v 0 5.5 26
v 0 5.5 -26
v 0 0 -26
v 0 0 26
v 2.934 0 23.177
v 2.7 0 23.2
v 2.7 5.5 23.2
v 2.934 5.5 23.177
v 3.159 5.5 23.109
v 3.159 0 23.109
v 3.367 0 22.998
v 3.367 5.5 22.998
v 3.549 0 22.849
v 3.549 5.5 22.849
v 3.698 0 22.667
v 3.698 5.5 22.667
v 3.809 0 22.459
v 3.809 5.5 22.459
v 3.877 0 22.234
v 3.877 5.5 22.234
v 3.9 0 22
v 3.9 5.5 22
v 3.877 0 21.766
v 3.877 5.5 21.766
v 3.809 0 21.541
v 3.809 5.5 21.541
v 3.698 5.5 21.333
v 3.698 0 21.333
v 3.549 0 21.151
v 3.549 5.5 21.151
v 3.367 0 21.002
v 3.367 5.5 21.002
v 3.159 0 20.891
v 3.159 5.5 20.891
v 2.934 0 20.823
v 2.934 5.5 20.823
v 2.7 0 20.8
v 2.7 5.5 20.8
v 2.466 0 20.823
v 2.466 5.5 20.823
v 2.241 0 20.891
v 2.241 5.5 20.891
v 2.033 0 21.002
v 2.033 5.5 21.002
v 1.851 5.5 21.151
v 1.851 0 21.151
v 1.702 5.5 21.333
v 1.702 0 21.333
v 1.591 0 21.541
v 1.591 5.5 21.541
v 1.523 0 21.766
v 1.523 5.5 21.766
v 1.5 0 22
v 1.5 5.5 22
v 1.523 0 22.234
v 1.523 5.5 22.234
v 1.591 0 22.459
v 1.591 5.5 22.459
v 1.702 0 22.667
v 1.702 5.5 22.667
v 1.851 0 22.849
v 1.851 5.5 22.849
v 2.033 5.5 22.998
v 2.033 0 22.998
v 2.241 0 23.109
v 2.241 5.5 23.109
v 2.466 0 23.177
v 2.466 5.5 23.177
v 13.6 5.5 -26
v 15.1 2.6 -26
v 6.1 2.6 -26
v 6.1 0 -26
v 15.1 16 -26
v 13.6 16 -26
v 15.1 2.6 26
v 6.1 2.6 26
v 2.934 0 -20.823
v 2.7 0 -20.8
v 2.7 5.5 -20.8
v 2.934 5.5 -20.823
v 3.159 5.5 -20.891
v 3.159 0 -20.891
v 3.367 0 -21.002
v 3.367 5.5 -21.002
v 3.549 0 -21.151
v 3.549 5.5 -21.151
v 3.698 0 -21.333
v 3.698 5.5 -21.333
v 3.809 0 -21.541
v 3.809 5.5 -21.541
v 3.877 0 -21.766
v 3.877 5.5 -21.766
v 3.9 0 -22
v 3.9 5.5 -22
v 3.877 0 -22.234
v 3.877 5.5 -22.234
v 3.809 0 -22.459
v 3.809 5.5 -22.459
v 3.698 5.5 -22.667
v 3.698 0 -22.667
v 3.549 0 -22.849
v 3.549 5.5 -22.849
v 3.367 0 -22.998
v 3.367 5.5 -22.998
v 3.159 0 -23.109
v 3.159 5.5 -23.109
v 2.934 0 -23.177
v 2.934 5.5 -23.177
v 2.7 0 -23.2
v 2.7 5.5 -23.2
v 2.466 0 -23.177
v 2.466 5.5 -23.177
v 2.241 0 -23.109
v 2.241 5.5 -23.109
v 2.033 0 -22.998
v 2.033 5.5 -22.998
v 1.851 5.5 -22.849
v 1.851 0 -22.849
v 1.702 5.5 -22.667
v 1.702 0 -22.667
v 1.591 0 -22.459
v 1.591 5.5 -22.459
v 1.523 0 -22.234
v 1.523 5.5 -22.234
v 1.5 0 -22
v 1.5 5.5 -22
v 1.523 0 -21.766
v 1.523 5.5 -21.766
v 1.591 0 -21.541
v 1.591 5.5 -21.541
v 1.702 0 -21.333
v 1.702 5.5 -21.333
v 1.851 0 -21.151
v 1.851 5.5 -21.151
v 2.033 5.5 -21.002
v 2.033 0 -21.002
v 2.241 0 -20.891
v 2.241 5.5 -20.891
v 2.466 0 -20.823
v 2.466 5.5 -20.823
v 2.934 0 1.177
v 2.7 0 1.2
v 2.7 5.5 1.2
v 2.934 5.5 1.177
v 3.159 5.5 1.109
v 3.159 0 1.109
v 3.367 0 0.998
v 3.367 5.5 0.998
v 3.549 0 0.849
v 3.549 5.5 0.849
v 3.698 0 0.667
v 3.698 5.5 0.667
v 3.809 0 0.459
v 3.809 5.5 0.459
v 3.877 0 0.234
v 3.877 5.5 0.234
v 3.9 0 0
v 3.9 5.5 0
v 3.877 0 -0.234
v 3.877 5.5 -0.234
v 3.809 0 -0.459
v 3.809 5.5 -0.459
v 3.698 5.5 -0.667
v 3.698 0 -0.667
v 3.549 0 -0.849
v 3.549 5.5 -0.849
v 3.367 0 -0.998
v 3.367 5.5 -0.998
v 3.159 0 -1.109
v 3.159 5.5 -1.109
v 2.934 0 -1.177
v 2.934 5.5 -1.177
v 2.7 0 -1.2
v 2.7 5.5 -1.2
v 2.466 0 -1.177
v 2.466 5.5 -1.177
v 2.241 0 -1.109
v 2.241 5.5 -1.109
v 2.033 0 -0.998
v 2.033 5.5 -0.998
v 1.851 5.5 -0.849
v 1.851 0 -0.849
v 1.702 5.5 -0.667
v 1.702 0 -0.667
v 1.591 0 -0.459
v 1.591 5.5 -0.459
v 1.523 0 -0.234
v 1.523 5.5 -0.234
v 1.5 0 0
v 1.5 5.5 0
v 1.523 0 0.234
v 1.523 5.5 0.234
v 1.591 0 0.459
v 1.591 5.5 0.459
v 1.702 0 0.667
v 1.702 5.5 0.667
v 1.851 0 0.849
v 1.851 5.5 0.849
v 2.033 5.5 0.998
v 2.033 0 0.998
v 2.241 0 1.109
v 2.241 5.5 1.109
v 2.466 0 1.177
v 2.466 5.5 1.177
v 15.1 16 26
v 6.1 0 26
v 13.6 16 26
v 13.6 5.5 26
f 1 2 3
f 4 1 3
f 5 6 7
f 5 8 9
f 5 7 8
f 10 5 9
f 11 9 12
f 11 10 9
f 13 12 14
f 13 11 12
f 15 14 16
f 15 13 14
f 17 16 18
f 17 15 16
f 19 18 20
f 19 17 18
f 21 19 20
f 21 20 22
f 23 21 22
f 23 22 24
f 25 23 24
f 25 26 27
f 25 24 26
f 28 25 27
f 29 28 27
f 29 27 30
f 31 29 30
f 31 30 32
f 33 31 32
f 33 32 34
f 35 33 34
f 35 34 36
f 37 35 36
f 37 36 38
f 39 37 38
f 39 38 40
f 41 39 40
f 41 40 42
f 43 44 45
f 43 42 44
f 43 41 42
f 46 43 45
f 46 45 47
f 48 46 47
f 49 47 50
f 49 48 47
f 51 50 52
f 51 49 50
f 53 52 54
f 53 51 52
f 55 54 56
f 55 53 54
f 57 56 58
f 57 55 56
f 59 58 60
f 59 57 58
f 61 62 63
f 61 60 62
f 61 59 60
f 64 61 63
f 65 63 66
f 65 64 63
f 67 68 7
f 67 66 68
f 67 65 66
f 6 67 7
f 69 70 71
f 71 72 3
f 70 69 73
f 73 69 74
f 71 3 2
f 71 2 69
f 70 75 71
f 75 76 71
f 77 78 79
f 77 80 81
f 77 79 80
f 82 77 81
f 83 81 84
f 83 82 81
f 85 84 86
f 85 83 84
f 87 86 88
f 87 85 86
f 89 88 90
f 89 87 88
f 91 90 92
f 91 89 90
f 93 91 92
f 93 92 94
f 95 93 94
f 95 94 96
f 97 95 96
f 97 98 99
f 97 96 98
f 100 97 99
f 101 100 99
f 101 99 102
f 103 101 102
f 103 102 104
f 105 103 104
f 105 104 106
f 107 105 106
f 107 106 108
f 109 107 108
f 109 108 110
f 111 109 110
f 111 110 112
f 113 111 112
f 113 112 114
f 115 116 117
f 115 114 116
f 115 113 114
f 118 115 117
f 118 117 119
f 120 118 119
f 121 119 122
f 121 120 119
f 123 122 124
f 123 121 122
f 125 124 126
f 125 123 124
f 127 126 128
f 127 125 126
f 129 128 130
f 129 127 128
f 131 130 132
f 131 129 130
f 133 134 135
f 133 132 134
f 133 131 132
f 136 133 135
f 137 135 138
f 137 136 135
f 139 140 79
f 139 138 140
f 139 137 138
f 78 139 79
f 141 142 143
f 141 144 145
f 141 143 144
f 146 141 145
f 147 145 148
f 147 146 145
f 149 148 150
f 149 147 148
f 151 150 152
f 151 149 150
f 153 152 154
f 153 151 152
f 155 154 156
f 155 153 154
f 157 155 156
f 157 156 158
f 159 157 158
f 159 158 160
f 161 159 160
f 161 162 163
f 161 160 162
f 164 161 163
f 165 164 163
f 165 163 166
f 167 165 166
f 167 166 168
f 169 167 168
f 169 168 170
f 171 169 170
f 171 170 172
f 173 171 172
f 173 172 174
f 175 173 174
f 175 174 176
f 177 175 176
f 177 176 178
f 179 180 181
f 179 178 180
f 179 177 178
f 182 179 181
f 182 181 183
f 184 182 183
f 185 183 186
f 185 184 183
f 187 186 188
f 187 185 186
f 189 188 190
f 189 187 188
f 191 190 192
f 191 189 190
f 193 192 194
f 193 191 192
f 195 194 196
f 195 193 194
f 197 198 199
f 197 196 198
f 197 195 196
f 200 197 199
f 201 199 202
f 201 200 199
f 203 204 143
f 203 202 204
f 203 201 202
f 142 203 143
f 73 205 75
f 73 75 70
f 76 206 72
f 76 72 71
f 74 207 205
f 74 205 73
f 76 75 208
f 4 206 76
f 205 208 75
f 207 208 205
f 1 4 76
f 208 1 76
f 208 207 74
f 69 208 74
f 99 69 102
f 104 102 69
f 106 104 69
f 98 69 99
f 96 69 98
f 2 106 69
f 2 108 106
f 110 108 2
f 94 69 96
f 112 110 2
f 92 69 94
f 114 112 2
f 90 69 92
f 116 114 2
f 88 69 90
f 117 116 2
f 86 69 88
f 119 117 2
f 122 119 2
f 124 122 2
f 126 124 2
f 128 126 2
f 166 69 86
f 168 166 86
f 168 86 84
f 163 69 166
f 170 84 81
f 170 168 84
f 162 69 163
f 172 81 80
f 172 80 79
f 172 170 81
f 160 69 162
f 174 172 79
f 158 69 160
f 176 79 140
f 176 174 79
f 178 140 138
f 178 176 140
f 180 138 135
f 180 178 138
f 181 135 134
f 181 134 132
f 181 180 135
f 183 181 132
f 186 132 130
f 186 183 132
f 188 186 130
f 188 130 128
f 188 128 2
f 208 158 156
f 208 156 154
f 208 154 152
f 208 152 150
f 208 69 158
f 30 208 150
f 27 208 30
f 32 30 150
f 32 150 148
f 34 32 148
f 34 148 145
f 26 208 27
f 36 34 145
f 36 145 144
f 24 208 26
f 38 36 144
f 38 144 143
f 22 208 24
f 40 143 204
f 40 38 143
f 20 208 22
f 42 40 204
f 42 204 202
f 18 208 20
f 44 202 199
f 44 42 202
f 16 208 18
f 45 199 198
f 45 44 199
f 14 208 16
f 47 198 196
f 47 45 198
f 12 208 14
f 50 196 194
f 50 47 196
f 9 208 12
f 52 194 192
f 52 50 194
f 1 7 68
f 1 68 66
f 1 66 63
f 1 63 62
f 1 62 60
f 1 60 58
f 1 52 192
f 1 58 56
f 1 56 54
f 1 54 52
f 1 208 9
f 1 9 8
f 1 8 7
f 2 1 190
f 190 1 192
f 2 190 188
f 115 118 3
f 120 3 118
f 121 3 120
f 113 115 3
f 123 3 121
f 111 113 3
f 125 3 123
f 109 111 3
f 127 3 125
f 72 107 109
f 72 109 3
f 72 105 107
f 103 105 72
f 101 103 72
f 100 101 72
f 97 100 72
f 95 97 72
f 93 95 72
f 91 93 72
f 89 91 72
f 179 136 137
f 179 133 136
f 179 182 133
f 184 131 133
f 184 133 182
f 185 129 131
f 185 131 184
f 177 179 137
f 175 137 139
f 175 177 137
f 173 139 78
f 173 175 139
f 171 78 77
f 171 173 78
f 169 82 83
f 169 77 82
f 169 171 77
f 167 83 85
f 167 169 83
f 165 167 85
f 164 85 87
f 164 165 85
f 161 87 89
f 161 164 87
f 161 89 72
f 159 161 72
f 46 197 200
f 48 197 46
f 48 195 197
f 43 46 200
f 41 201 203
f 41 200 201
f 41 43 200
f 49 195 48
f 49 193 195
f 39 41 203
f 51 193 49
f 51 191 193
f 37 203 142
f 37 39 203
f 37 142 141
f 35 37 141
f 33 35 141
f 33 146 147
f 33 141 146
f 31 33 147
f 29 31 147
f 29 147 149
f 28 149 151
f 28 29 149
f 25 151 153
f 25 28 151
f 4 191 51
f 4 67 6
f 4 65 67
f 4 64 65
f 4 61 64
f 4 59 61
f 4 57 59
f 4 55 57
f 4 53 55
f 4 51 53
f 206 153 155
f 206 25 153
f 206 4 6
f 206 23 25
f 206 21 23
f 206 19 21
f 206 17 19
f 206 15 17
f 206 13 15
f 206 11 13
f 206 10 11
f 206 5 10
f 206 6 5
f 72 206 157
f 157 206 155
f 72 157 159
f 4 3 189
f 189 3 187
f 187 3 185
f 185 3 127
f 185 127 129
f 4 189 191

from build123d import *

# Parameters (mm, degrees)
BOSS_EXTRUDE2_DEPTH     = 26
CUT_EXTRUDE2_DEPTH      = 30.853140538
CUT_EXTRUDE2_DEPTH_BACK = 30.853140538
SKETCH2_R               = 1.2
SKETCH3_W               = 52
SKETCH3_H               = 13.4
BOSS_EXTRUDE3_DEPTH     = 1.5


with BuildPart() as part:
    # Sketch1 → Boss-Extrude2 (new, symmetric)
    with BuildSketch(Plane.XY):
        Polygon((0, 0), (6.1, 0), (6.1, 2.6), (13.6, 2.6), (13.6, 5.5), (0, 5.5), align=None)
    extrude(amount=BOSS_EXTRUDE2_DEPTH, both=True)

    # Sketch2 → Cut-Extrude2 (cut, two sides: drawn at the far end of the back side and taken through both)
    with BuildSketch(Plane(origin=(0, 0, 0), x_dir=(1, 0, 0), z_dir=(0, 1, 0)).offset(-CUT_EXTRUDE2_DEPTH_BACK)):
        with Locations(Location((2.7, 22, 0), (0, 0, 270))):
            Circle(SKETCH2_R)
        with Locations(Location((2.7, 0, 0), (0, 0, 270))):
            Circle(SKETCH2_R)
        with Locations(Location((2.7, -22, 0), (0, 0, 270))):
            Circle(SKETCH2_R)
    extrude(amount=CUT_EXTRUDE2_DEPTH + CUT_EXTRUDE2_DEPTH_BACK, mode=Mode.SUBTRACT)

    # Sketch3 → Boss-Extrude3 (add)
    with BuildSketch(Plane(origin=(13.6, 0, 0), x_dir=(0, 0, -1), z_dir=(1, 0, 0))):
        with Locations((0, 9.3)):
            Rectangle(SKETCH3_W, SKETCH3_H)
    extrude(amount=BOSS_EXTRUDE3_DEPTH)


solid = part.part
